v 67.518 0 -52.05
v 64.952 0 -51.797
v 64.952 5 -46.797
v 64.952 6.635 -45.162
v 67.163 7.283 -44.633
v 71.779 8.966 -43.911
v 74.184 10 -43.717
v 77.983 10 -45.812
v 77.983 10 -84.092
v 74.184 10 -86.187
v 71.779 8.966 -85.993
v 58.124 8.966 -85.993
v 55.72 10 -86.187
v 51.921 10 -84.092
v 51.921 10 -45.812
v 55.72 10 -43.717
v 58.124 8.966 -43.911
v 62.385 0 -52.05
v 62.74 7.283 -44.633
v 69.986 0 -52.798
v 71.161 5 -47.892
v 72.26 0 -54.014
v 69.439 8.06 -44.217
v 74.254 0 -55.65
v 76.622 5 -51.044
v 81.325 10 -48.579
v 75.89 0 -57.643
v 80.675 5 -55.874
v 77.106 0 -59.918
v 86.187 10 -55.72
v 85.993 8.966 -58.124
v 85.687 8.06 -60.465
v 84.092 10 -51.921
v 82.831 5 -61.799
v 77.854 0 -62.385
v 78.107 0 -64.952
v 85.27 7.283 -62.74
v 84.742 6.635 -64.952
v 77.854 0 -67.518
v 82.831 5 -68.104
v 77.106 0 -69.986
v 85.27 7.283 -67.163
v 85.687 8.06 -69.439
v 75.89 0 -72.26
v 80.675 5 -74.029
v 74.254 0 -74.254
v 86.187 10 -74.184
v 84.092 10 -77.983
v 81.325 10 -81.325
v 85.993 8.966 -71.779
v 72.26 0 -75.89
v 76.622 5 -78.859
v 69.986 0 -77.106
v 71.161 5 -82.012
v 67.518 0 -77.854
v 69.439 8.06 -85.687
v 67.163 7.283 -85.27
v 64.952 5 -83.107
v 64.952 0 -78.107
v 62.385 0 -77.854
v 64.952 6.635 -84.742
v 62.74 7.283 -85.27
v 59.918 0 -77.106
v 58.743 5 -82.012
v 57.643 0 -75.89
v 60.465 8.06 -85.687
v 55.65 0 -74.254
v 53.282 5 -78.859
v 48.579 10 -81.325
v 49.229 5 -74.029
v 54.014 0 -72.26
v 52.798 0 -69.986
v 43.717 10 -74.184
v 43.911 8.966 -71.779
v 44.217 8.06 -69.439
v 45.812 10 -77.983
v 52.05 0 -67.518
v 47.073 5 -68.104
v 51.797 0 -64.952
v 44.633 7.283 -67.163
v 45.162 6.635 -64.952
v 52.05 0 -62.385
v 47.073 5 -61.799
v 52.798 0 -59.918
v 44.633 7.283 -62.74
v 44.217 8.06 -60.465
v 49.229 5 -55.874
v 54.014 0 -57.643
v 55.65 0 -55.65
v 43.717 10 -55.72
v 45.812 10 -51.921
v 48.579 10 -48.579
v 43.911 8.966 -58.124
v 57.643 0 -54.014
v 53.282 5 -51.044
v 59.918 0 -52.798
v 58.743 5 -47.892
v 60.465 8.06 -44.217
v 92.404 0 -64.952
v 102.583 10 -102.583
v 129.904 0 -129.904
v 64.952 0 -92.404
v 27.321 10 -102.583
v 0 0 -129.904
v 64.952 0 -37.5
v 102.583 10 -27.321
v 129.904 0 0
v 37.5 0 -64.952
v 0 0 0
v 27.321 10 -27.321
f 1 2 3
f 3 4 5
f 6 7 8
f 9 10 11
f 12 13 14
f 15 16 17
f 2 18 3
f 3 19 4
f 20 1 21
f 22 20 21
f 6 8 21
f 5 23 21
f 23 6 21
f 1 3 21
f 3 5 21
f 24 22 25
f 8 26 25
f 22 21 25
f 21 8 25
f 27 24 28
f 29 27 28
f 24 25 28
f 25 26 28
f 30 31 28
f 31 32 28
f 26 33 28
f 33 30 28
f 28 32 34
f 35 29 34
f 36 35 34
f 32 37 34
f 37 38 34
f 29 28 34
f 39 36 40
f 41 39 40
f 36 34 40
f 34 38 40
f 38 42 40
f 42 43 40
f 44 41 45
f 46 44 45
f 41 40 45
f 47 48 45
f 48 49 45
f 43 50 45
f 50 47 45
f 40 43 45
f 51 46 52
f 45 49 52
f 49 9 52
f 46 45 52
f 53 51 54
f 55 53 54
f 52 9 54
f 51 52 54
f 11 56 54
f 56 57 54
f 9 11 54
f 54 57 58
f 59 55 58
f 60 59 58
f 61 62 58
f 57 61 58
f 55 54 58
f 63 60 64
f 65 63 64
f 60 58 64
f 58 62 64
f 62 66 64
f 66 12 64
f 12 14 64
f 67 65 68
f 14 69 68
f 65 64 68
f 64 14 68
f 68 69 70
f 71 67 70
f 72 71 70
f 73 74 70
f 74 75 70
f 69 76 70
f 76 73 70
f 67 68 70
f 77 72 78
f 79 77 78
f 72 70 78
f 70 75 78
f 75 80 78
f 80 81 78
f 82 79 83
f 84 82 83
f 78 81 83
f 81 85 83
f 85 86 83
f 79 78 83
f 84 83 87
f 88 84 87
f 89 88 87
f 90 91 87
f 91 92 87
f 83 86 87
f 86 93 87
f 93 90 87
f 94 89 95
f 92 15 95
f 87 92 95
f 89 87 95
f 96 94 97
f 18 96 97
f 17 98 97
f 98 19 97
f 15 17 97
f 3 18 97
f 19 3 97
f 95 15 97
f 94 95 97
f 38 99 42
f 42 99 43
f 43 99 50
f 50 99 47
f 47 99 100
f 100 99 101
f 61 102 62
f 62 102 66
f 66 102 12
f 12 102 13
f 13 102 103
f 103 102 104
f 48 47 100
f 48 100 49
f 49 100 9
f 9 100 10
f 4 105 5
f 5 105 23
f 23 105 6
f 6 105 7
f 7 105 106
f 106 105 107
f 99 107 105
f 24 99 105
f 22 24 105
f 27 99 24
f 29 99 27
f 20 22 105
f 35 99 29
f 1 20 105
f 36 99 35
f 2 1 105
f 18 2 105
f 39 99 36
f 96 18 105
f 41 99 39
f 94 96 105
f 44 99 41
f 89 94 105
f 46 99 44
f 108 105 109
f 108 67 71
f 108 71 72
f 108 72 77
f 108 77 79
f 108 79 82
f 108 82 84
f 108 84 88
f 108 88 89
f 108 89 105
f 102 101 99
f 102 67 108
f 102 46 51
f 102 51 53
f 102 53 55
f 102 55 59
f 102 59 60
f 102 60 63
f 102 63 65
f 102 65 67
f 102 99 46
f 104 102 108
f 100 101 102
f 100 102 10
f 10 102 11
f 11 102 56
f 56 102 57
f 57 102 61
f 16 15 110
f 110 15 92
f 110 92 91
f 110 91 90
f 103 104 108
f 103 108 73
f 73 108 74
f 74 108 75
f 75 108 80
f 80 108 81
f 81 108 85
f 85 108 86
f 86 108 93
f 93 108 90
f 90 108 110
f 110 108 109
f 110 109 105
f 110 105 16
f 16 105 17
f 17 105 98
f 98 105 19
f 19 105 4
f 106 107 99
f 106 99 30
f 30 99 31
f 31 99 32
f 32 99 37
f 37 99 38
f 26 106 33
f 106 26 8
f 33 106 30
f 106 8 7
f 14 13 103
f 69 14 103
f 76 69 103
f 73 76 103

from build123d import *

# Parameters (mm, degrees)
SKETCH1_R           = 13.155
BOSS_EXTRUDE1_DEPTH = 10
CHAMFER4_SIZE       = 10


with BuildPart() as part:
    # Sketch1 → Boss-Extrude1 (new body)
    with BuildSketch(Plane(origin=(0, 0, 0), x_dir=(1, 0, 0), z_dir=(0, 1, 0))):
        Polygon((0, 0), (37.5, 64.951905284), (0, 129.903810568), (64.951905284, 92.403810568), (129.903810568, 129.903810568), (92.403810568, 64.951905284), (129.903810568, 0), (64.951905284, 37.5), align=None)
        with Locations(Location((64.951905284, 64.951905284, 0), (0, 0, 270))):
            Circle(SKETCH1_R, mode=Mode.SUBTRACT)
    extrude(amount=BOSS_EXTRUDE1_DEPTH)

    # Chamfer4
    # the kernel refuses this chamfer: 10 mm, written as the material it takes off along each edge
    with BuildSketch(Plane(origin=(64.951905284, 10, -64.951905284), x_dir=(0, 0, 1), z_dir=(-1, 0, 0))) as chamfer4_piece_1:
        Polygon((13.155, -CHAMFER4_SIZE), (13.155 + CHAMFER4_SIZE, 0), (13.155, 0), align=None)
    revolve(axis=Axis((64.951905284, 10, -64.951905284), (0, 1, 0)), mode=Mode.SUBTRACT)
    with BuildSketch(Plane(origin=(-12.85841494, 10, 22.271427981), x_dir=(-0.023812127644090117, -0.9996219169112968, -0.013747938305293196), z_dir=(0.5000000000000011, 0, -0.866025403784438))) as chamfer4_piece_2_section:
        Polygon((CHAMFER4_SIZE * 0.999621916911, -CHAMFER4_SIZE * 0.0274958766106), (-CHAMFER4_SIZE * 0.0274958766106, -CHAMFER4_SIZE * 0.999621916911), (0, 0), align=None)
    chamfer4_piece_2 = extrude(amount=126.433659759, mode=Mode.PRIVATE)
    chamfer4_piece_2 = split(chamfer4_piece_2, bisect_by=Plane(origin=(51.736915966, 6.682227924, -40.292843487), z_dir=(-0.8660254037844383, 0, 0.5000000000000009)), keep=Keep.TOP, mode=Mode.PRIVATE)
    add(chamfer4_piece_2, mode=Mode.SUBTRACT)
    with BuildSketch(Plane(origin=(50.35841494, 10, -42.680477303), x_dir=(-0.02381212764408977, -0.9996219169112968, 0.013747938305292988), z_dir=(-0.5000000000000009, 0, -0.8660254037844383))) as chamfer4_piece_3_section:
        Polygon((CHAMFER4_SIZE * 0.999621916911, -CHAMFER4_SIZE * 0.0274958766106), (-CHAMFER4_SIZE * 0.0274958766106, -CHAMFER4_SIZE * 0.999621916911), (0, 0), align=None)
    chamfer4_piece_3 = extrude(amount=126.433659759, mode=Mode.PRIVATE)
    chamfer4_piece_3 = split(chamfer4_piece_3, bisect_by=Plane(origin=(51.736915966, 6.682227924, -89.610967081), z_dir=(-0.866025403784438, 0, -0.5000000000000011)), keep=Keep.TOP, mode=Mode.PRIVATE)
    add(chamfer4_piece_3, mode=Mode.SUBTRACT)
    with BuildSketch(Plane(origin=(-22.271427981, 10, -142.762225507), x_dir=(0.01374793830529321, -0.9996219169112968, -0.023812127644090134), z_dir=(0.866025403784438, 0, 0.5000000000000012))) as chamfer4_piece_4_section:
        Polygon((CHAMFER4_SIZE * 0.999621916911, -CHAMFER4_SIZE * 0.0274958766106), (-CHAMFER4_SIZE * 0.0274958766106, -CHAMFER4_SIZE * 0.999621916911), (0, 0), align=None)
    chamfer4_piece_4 = extrude(amount=126.433659759, mode=Mode.PRIVATE)
    chamfer4_piece_4 = split(chamfer4_piece_4, bisect_by=Plane(origin=(40.292843487, 6.682227924, -78.166894601), z_dir=(-0.5000000000000012, 0, -0.866025403784438)), keep=Keep.TOP, mode=Mode.PRIVATE)
    add(chamfer4_piece_4, mode=Mode.SUBTRACT)
    with BuildSketch(Plane(origin=(42.680477303, 10, -79.545395628), x_dir=(-0.01374793830529287, -0.9996219169112968, -0.023812127644089548), z_dir=(0.866025403784438, 0, -0.5000000000000012))) as chamfer4_piece_5_section:
        Polygon((CHAMFER4_SIZE * 0.999621916911, -CHAMFER4_SIZE * 0.0274958766106), (-CHAMFER4_SIZE * 0.0274958766106, -CHAMFER4_SIZE * 0.999621916911), (0, 0), align=None)
    chamfer4_piece_5 = extrude(amount=126.433659759, mode=Mode.PRIVATE)
    chamfer4_piece_5 = split(chamfer4_piece_5, bisect_by=Plane(origin=(89.610967081, 6.682227924, -78.166894601), z_dir=(0.5000000000000012, 0, -0.866025403784438)), keep=Keep.TOP, mode=Mode.PRIVATE)
    add(chamfer4_piece_5, mode=Mode.SUBTRACT)
    with BuildSketch(Plane(origin=(142.762225507, 10, -152.175238548), x_dir=(0.023812127644092358, -0.9996219169112965, 0.013747938305294477), z_dir=(-0.5000000000000007, 0, 0.8660254037844384))) as chamfer4_piece_6_section:
        Polygon((CHAMFER4_SIZE * 0.999621916911, -CHAMFER4_SIZE * 0.0274958766106), (-CHAMFER4_SIZE * 0.0274958766106, -CHAMFER4_SIZE * 0.999621916911), (0, 0), align=None)
    chamfer4_piece_6 = extrude(amount=126.433659759, mode=Mode.PRIVATE)
    chamfer4_piece_6 = split(chamfer4_piece_6, bisect_by=Plane(origin=(78.166894601, 6.682227924, -89.610967081), z_dir=(0.8660254037844382, 0, -0.500000000000001)), keep=Keep.TOP, mode=Mode.PRIVATE)
    add(chamfer4_piece_6, mode=Mode.SUBTRACT)
    with BuildSketch(Plane(origin=(79.545395628, 10, -87.223333264), x_dir=(0.023812127644090287, -0.9996219169112968, -0.013747938305293292), z_dir=(0.500000000000001, 0, 0.8660254037844382))) as chamfer4_piece_7_section:
        Polygon((CHAMFER4_SIZE * 0.999621916911, -CHAMFER4_SIZE * 0.0274958766106), (-CHAMFER4_SIZE * 0.0274958766106, -CHAMFER4_SIZE * 0.999621916911), (0, 0), align=None)
    chamfer4_piece_7 = extrude(amount=126.433659759, mode=Mode.PRIVATE)
    chamfer4_piece_7 = split(chamfer4_piece_7, bisect_by=Plane(origin=(78.166894601, 6.682227924, -40.292843487), z_dir=(0.8660254037844384, 0, 0.5000000000000007)), keep=Keep.TOP, mode=Mode.PRIVATE)
    add(chamfer4_piece_7, mode=Mode.SUBTRACT)
    with BuildSketch(Plane(origin=(152.175238548, 10, 12.85841494), x_dir=(-0.013747938305293, -0.9996219169112968, 0.023812127644089767), z_dir=(-0.8660254037844379, 0, -0.5000000000000012))) as chamfer4_piece_8_section:
        Polygon((CHAMFER4_SIZE * 0.999621916911, -CHAMFER4_SIZE * 0.0274958766106), (-CHAMFER4_SIZE * 0.0274958766106, -CHAMFER4_SIZE * 0.999621916911), (0, 0), align=None)
    chamfer4_piece_8 = extrude(amount=126.433659759, mode=Mode.PRIVATE)
    chamfer4_piece_8 = split(chamfer4_piece_8, bisect_by=Plane(origin=(89.610967081, 6.682227924, -51.736915966), z_dir=(0.5000000000000012, 0, 0.8660254037844379)), keep=Keep.TOP, mode=Mode.PRIVATE)
    add(chamfer4_piece_8, mode=Mode.SUBTRACT)
    with BuildSketch(Plane(origin=(87.223333264, 10, -50.35841494), x_dir=(0.013747938305293599, -0.9996219169112968, 0.0238121276440908), z_dir=(-0.8660254037844379, 0, 0.5000000000000012))) as chamfer4_piece_9_section:
        Polygon((CHAMFER4_SIZE * 0.999621916911, -CHAMFER4_SIZE * 0.0274958766106), (-CHAMFER4_SIZE * 0.0274958766106, -CHAMFER4_SIZE * 0.999621916911), (0, 0), align=None)
    chamfer4_piece_9 = extrude(amount=126.433659759, mode=Mode.PRIVATE)
    chamfer4_piece_9 = split(chamfer4_piece_9, bisect_by=Plane(origin=(40.292843487, 6.682227924, -51.736915966), z_dir=(-0.5000000000000012, 0, 0.8660254037844379)), keep=Keep.TOP, mode=Mode.PRIVATE)
    add(chamfer4_piece_9, mode=Mode.SUBTRACT)
    with BuildSketch(Plane(origin=(-12.85841494, 10, 22.271427981), x_dir=(-0.023812127644090117, -0.9996219169112968, -0.013747938305293196), z_dir=(0.5000000000000011, 0, -0.866025403784438))) as chamfer4_piece_10a_section:
        Polygon((CHAMFER4_SIZE * 0.999621916911, -CHAMFER4_SIZE * 0.0274958766106), (-CHAMFER4_SIZE * 0.0274958766106, -CHAMFER4_SIZE * 0.999621916911), (0, 0), align=None)
    chamfer4_piece_10a = extrude(amount=126.433659759, mode=Mode.PRIVATE)
    chamfer4_piece_10a = split(chamfer4_piece_10a, bisect_by=Plane(origin=(36.018509, 6.773025627, -67.517922967), z_dir=(0.8660254037844383, 0, -0.5000000000000009)), keep=Keep.TOP, mode=Mode.PRIVATE)
    with BuildSketch(Plane(origin=(50.35841494, 10, -42.680477303), x_dir=(-0.02381212764408977, -0.9996219169112968, 0.013747938305292988), z_dir=(-0.5000000000000009, 0, -0.8660254037844383))) as chamfer4_piece_10b_section:
        Polygon((CHAMFER4_SIZE * 0.999621916911, -CHAMFER4_SIZE * 0.0274958766106), (-CHAMFER4_SIZE * 0.0274958766106, -CHAMFER4_SIZE * 0.999621916911), (0, 0), align=None)
    chamfer4_piece_10b = extrude(amount=126.433659759, mode=Mode.PRIVATE)
    chamfer4_piece_10b = split(chamfer4_piece_10b, bisect_by=Plane(origin=(36.018509, 6.773025627, -62.385887601), z_dir=(0.866025403784438, 0, 0.5000000000000011)), keep=Keep.TOP, mode=Mode.PRIVATE)
    chamfer4_piece_10 = chamfer4_piece_10a & chamfer4_piece_10b
    add(chamfer4_piece_10, mode=Mode.SUBTRACT)
    with BuildSketch(Plane(origin=(-22.271427981, 10, -142.762225507), x_dir=(0.01374793830529321, -0.9996219169112968, -0.023812127644090134), z_dir=(0.866025403784438, 0, 0.5000000000000012))) as chamfer4_piece_11a_section:
        Polygon((CHAMFER4_SIZE * 0.999621916911, -CHAMFER4_SIZE * 0.0274958766106), (-CHAMFER4_SIZE * 0.0274958766106, -CHAMFER4_SIZE * 0.999621916911), (0, 0), align=None)
    chamfer4_piece_11a = extrude(amount=126.433659759, mode=Mode.PRIVATE)
    chamfer4_piece_11a = split(chamfer4_piece_11a, bisect_by=Plane(origin=(67.517922967, 6.773025627, -93.885301568), z_dir=(0.5000000000000012, 0, 0.866025403784438)), keep=Keep.TOP, mode=Mode.PRIVATE)
    with BuildSketch(Plane(origin=(42.680477303, 10, -79.545395628), x_dir=(-0.01374793830529287, -0.9996219169112968, -0.023812127644089548), z_dir=(0.866025403784438, 0, -0.5000000000000012))) as chamfer4_piece_11b_section:
        Polygon((CHAMFER4_SIZE * 0.999621916911, -CHAMFER4_SIZE * 0.0274958766106), (-CHAMFER4_SIZE * 0.0274958766106, -CHAMFER4_SIZE * 0.999621916911), (0, 0), align=None)
    chamfer4_piece_11b = extrude(amount=126.433659759, mode=Mode.PRIVATE)
    chamfer4_piece_11b = split(chamfer4_piece_11b, bisect_by=Plane(origin=(62.385887601, 6.773025627, -93.885301568), z_dir=(-0.5000000000000012, 0, 0.866025403784438)), keep=Keep.TOP, mode=Mode.PRIVATE)
    chamfer4_piece_11 = chamfer4_piece_11a & chamfer4_piece_11b
    add(chamfer4_piece_11, mode=Mode.SUBTRACT)
    with BuildSketch(Plane(origin=(142.762225507, 10, -152.175238548), x_dir=(0.023812127644092358, -0.9996219169112965, 0.013747938305294477), z_dir=(-0.5000000000000007, 0, 0.8660254037844384))) as chamfer4_piece_12a_section:
        Polygon((CHAMFER4_SIZE * 0.999621916911, -CHAMFER4_SIZE * 0.0274958766106), (-CHAMFER4_SIZE * 0.0274958766106, -CHAMFER4_SIZE * 0.999621916911), (0, 0), align=None)
    chamfer4_piece_12a = extrude(amount=126.433659759, mode=Mode.PRIVATE)
    chamfer4_piece_12a = split(chamfer4_piece_12a, bisect_by=Plane(origin=(93.885301568, 6.773025627, -62.385887601), z_dir=(-0.8660254037844382, 0, 0.500000000000001)), keep=Keep.TOP, mode=Mode.PRIVATE)
    with BuildSketch(Plane(origin=(79.545395628, 10, -87.223333264), x_dir=(0.023812127644090287, -0.9996219169112968, -0.013747938305293292), z_dir=(0.500000000000001, 0, 0.8660254037844382))) as chamfer4_piece_12b_section:
        Polygon((CHAMFER4_SIZE * 0.999621916911, -CHAMFER4_SIZE * 0.0274958766106), (-CHAMFER4_SIZE * 0.0274958766106, -CHAMFER4_SIZE * 0.999621916911), (0, 0), align=None)
    chamfer4_piece_12b = extrude(amount=126.433659759, mode=Mode.PRIVATE)
    chamfer4_piece_12b = split(chamfer4_piece_12b, bisect_by=Plane(origin=(93.885301568, 6.773025627, -67.517922967), z_dir=(-0.8660254037844384, 0, -0.5000000000000007)), keep=Keep.TOP, mode=Mode.PRIVATE)
    chamfer4_piece_12 = chamfer4_piece_12a & chamfer4_piece_12b
    add(chamfer4_piece_12, mode=Mode.SUBTRACT)
    with BuildSketch(Plane(origin=(152.175238548, 10, 12.85841494), x_dir=(-0.013747938305293, -0.9996219169112968, 0.023812127644089767), z_dir=(-0.8660254037844379, 0, -0.5000000000000012))) as chamfer4_piece_13a_section:
        Polygon((CHAMFER4_SIZE * 0.999621916911, -CHAMFER4_SIZE * 0.0274958766106), (-CHAMFER4_SIZE * 0.0274958766106, -CHAMFER4_SIZE * 0.999621916911), (0, 0), align=None)
    chamfer4_piece_13a = extrude(amount=126.433659759, mode=Mode.PRIVATE)
    chamfer4_piece_13a = split(chamfer4_piece_13a, bisect_by=Plane(origin=(62.385887601, 6.773025627, -36.018509), z_dir=(-0.5000000000000012, 0, -0.8660254037844379)), keep=Keep.TOP, mode=Mode.PRIVATE)
    with BuildSketch(Plane(origin=(87.223333264, 10, -50.35841494), x_dir=(0.013747938305293599, -0.9996219169112968, 0.0238121276440908), z_dir=(-0.8660254037844379, 0, 0.5000000000000012))) as chamfer4_piece_13b_section:
        Polygon((CHAMFER4_SIZE * 0.999621916911, -CHAMFER4_SIZE * 0.0274958766106), (-CHAMFER4_SIZE * 0.0274958766106, -CHAMFER4_SIZE * 0.999621916911), (0, 0), align=None)
    chamfer4_piece_13b = extrude(amount=126.433659759, mode=Mode.PRIVATE)
    chamfer4_piece_13b = split(chamfer4_piece_13b, bisect_by=Plane(origin=(67.517922967, 6.773025627, -36.018509), z_dir=(0.5000000000000012, 0, -0.8660254037844379)), keep=Keep.TOP, mode=Mode.PRIVATE)
    chamfer4_piece_13 = chamfer4_piece_13a & chamfer4_piece_13b
    add(chamfer4_piece_13, mode=Mode.SUBTRACT)


solid = part.part
